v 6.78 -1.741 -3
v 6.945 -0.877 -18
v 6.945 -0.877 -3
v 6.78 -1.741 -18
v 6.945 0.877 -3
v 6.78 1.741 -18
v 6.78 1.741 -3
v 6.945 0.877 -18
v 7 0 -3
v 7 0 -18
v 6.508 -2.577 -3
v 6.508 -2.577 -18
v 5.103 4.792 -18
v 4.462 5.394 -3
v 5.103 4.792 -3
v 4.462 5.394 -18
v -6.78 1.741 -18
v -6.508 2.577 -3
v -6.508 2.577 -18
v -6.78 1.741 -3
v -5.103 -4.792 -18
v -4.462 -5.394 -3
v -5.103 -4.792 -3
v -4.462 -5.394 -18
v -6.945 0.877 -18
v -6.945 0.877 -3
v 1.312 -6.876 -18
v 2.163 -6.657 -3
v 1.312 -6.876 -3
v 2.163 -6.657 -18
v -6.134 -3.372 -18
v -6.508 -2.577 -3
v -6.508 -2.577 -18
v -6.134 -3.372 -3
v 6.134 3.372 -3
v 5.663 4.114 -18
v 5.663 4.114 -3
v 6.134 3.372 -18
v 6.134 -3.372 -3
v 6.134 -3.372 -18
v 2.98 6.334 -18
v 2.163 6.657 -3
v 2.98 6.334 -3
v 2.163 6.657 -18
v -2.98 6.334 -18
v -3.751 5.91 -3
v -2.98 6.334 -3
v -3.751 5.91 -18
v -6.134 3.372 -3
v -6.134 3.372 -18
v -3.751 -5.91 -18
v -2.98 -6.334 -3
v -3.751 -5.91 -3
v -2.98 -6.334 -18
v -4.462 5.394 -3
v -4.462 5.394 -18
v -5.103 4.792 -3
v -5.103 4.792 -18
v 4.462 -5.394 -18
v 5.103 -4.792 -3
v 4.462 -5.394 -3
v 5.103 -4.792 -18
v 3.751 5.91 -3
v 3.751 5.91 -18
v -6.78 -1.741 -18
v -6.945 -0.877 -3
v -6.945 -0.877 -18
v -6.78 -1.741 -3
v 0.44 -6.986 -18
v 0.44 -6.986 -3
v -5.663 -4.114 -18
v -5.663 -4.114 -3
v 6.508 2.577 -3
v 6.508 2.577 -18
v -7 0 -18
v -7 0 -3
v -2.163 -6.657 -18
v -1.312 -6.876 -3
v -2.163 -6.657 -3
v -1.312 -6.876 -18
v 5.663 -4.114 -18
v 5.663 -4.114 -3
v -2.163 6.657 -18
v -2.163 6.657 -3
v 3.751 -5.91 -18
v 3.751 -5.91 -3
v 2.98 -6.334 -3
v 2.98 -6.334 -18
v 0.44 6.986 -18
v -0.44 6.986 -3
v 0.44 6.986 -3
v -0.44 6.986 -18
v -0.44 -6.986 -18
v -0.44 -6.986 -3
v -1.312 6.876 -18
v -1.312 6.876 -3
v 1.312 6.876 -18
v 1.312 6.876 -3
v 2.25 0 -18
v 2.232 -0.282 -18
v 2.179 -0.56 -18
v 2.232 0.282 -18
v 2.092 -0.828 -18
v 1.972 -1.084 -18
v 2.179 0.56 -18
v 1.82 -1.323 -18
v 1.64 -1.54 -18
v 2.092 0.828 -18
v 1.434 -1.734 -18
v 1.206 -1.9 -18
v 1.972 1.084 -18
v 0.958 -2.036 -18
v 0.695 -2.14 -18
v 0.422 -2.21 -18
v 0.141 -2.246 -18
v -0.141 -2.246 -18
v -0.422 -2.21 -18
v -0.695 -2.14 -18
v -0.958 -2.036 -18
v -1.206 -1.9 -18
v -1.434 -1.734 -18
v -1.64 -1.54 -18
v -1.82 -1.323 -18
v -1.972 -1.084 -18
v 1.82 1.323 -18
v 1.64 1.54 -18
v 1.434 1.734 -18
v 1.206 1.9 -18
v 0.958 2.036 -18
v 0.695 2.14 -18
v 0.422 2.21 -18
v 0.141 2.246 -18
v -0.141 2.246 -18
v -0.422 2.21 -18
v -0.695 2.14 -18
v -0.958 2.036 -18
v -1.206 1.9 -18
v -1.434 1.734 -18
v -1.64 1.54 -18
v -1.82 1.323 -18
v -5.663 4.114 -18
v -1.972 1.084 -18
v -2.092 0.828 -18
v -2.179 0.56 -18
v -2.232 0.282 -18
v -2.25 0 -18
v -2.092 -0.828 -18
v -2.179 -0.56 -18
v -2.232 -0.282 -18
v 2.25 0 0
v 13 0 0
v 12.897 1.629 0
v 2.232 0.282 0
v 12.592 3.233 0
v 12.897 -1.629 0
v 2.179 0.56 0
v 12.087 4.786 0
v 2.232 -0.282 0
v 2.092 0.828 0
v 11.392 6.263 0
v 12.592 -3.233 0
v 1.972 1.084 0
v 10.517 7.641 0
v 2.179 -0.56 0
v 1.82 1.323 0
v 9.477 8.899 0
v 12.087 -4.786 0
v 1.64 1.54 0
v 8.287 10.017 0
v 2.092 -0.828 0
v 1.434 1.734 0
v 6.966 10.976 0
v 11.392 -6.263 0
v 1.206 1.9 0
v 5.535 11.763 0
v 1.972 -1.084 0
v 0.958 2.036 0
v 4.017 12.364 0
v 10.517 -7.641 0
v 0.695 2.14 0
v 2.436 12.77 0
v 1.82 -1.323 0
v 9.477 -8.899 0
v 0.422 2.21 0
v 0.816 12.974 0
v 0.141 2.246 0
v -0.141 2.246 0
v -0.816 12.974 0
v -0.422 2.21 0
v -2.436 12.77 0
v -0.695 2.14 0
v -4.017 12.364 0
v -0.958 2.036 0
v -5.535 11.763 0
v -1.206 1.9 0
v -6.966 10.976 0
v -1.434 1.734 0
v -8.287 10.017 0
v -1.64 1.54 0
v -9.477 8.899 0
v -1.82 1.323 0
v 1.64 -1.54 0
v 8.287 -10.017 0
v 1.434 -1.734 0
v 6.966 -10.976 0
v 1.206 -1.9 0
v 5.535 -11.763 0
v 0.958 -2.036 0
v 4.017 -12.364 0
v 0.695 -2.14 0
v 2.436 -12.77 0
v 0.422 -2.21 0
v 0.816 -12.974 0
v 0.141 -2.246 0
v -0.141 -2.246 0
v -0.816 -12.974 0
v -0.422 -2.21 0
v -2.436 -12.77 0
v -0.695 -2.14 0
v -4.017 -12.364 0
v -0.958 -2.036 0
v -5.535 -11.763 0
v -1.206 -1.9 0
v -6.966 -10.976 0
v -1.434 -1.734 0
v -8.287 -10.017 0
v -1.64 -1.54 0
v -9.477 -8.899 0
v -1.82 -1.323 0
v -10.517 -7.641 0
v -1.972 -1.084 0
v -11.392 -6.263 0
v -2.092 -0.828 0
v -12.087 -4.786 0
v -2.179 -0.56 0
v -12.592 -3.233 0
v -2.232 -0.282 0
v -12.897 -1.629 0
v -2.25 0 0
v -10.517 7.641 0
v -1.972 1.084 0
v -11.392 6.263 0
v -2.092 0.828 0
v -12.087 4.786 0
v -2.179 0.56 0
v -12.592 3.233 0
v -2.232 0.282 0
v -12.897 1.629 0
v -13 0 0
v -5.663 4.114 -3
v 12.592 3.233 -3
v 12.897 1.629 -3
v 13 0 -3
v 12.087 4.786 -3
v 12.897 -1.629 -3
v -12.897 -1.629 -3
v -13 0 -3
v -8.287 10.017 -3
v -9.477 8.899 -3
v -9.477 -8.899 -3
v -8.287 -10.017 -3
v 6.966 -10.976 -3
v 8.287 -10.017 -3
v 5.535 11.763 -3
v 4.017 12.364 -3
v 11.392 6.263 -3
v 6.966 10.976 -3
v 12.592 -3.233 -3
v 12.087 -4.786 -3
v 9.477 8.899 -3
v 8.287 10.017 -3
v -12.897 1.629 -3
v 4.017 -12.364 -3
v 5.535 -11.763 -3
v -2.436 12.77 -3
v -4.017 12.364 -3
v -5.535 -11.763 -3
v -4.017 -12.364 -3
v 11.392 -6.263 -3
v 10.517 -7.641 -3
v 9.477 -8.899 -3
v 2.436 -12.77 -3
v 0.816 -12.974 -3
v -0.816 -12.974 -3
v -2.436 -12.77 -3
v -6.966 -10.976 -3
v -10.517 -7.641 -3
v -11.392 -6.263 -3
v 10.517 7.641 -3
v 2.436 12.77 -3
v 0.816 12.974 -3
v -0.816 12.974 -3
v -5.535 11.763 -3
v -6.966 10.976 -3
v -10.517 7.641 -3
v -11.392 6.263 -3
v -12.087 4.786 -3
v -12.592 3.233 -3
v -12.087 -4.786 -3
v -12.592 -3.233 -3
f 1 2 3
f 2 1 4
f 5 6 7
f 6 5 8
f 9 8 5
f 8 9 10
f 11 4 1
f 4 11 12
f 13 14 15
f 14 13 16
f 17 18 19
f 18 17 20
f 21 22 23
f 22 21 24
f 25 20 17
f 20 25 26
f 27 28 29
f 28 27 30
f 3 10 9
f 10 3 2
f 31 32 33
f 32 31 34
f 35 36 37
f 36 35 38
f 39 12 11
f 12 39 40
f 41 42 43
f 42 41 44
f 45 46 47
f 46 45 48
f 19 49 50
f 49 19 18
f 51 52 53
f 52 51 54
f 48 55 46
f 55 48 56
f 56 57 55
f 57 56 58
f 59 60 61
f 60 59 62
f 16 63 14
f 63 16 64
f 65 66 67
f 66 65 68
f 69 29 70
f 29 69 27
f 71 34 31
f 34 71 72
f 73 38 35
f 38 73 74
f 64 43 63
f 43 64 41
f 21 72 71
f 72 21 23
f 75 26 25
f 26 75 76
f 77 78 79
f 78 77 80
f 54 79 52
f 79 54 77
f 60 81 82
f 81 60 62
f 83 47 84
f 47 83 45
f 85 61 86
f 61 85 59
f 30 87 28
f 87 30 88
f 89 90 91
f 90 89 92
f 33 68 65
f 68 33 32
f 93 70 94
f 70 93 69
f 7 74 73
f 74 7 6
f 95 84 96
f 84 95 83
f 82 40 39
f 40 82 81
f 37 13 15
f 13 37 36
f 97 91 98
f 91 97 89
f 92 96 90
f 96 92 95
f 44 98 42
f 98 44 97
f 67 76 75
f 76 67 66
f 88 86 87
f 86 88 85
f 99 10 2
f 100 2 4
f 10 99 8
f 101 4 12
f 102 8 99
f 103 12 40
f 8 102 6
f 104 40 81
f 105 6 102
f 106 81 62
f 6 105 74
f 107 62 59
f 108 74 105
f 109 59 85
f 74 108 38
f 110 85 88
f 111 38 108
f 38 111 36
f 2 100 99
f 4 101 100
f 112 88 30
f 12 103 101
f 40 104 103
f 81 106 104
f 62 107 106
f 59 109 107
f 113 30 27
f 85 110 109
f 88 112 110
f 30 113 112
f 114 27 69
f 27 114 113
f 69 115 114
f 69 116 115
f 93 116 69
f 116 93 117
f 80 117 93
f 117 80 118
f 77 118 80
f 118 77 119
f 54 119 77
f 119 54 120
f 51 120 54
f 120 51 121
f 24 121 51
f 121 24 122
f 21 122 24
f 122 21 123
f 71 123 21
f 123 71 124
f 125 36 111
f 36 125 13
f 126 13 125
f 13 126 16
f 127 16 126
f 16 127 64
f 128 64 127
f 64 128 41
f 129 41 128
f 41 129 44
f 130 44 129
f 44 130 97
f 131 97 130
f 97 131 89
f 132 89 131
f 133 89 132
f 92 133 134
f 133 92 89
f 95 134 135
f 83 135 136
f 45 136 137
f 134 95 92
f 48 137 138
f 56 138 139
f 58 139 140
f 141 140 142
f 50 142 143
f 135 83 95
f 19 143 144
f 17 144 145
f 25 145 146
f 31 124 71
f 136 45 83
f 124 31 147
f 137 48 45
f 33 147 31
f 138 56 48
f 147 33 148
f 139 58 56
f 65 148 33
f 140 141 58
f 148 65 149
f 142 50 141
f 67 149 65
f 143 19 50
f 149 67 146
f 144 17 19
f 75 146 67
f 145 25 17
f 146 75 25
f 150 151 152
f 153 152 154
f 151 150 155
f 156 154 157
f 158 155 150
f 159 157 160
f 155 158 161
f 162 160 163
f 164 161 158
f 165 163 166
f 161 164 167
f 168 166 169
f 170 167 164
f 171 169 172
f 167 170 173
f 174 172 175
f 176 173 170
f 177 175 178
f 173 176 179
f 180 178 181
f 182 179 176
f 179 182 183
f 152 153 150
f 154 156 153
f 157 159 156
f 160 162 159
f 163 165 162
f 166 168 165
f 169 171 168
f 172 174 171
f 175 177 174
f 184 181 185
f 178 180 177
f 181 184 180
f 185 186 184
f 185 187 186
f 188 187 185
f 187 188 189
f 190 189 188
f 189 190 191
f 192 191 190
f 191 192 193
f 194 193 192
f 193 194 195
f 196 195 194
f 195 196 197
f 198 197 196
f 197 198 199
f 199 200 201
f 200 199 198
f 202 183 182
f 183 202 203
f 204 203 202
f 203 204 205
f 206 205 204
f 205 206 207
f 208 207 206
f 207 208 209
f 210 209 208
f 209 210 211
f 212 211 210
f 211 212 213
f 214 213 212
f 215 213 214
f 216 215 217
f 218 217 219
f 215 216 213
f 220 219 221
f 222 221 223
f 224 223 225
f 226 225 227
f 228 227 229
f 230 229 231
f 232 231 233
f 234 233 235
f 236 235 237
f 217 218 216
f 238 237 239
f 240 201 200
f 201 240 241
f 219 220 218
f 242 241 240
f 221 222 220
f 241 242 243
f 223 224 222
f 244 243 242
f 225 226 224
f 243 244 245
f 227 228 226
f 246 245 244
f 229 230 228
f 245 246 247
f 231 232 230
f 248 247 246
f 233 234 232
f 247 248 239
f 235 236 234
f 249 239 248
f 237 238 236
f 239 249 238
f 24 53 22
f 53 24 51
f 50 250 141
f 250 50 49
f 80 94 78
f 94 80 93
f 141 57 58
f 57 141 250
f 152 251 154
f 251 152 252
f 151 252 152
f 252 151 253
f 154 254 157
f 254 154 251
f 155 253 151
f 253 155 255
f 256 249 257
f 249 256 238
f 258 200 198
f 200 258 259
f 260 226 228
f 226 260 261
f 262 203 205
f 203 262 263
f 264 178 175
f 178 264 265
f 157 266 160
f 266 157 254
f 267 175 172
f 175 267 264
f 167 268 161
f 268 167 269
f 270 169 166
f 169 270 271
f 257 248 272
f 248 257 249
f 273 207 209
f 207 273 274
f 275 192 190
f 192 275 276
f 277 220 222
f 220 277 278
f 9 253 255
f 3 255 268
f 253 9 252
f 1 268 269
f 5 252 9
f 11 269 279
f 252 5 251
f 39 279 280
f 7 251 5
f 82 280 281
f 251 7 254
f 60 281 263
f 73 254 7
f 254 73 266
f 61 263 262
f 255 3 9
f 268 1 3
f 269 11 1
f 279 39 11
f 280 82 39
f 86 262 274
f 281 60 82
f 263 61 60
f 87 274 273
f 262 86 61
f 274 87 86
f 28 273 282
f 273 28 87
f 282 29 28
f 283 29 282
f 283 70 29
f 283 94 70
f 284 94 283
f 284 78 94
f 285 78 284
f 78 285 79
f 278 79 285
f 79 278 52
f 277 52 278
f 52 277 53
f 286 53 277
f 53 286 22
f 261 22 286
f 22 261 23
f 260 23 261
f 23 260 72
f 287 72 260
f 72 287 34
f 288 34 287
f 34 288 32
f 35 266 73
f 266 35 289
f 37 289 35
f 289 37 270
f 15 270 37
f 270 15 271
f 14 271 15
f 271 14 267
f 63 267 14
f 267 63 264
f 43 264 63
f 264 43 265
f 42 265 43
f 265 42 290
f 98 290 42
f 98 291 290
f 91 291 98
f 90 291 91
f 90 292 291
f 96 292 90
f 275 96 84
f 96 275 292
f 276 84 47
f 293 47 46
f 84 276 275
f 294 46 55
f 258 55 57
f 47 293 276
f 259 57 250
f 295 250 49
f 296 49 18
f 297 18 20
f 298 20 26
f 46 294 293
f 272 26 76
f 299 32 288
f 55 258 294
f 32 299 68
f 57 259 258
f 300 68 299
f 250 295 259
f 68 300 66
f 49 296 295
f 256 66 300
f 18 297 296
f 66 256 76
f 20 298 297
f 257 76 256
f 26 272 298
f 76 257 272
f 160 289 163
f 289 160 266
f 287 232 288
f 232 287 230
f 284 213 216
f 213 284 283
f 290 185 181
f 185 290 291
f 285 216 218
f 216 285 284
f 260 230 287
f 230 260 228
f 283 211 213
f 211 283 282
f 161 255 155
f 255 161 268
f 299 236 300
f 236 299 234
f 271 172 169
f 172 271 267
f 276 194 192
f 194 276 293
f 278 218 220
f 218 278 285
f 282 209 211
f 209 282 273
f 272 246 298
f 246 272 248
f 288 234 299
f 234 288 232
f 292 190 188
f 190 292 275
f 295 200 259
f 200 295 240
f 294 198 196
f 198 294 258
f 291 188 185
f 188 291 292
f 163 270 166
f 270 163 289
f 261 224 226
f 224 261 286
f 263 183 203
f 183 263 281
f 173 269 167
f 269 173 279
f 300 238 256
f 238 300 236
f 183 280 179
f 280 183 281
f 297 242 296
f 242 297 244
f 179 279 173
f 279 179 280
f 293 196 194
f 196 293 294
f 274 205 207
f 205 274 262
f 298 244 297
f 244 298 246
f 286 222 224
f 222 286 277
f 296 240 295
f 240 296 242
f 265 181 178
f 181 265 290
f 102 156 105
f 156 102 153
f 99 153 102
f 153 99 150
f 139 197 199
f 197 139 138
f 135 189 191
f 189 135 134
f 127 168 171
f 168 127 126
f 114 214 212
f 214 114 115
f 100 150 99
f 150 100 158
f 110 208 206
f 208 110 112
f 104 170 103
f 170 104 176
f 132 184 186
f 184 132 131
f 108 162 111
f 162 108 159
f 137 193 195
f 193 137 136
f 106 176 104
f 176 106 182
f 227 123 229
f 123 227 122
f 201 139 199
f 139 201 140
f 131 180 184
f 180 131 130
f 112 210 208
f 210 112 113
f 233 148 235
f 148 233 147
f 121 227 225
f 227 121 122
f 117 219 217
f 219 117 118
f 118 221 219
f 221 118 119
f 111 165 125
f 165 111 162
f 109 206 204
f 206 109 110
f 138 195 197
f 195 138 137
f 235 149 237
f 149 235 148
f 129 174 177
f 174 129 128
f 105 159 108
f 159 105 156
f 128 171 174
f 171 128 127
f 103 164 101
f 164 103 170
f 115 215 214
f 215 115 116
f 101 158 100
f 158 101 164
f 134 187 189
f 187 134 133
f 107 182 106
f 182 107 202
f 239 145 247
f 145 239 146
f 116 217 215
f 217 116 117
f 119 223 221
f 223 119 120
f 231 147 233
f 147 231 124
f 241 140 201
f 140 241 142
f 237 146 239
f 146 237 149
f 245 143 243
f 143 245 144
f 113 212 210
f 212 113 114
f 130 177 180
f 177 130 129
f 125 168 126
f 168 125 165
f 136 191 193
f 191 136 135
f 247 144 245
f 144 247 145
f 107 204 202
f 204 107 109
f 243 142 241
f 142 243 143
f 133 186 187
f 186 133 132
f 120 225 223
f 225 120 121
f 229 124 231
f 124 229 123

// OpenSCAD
$fn = 50;


difference() {
	union() {
		translate(v = [0, 0, -18.0000000000]) {
			cylinder(h = 18, r = 7.0000000000);
		}
		translate(v = [0, 0, -3.0000000000]) {
			cylinder(h = 3, r = 13.0000000000);
		}
	}
	union() {
		#translate(v = [0, 0, -18]) {
			cylinder(h = 18, r = 2.2500000000);
		}
	}
}
